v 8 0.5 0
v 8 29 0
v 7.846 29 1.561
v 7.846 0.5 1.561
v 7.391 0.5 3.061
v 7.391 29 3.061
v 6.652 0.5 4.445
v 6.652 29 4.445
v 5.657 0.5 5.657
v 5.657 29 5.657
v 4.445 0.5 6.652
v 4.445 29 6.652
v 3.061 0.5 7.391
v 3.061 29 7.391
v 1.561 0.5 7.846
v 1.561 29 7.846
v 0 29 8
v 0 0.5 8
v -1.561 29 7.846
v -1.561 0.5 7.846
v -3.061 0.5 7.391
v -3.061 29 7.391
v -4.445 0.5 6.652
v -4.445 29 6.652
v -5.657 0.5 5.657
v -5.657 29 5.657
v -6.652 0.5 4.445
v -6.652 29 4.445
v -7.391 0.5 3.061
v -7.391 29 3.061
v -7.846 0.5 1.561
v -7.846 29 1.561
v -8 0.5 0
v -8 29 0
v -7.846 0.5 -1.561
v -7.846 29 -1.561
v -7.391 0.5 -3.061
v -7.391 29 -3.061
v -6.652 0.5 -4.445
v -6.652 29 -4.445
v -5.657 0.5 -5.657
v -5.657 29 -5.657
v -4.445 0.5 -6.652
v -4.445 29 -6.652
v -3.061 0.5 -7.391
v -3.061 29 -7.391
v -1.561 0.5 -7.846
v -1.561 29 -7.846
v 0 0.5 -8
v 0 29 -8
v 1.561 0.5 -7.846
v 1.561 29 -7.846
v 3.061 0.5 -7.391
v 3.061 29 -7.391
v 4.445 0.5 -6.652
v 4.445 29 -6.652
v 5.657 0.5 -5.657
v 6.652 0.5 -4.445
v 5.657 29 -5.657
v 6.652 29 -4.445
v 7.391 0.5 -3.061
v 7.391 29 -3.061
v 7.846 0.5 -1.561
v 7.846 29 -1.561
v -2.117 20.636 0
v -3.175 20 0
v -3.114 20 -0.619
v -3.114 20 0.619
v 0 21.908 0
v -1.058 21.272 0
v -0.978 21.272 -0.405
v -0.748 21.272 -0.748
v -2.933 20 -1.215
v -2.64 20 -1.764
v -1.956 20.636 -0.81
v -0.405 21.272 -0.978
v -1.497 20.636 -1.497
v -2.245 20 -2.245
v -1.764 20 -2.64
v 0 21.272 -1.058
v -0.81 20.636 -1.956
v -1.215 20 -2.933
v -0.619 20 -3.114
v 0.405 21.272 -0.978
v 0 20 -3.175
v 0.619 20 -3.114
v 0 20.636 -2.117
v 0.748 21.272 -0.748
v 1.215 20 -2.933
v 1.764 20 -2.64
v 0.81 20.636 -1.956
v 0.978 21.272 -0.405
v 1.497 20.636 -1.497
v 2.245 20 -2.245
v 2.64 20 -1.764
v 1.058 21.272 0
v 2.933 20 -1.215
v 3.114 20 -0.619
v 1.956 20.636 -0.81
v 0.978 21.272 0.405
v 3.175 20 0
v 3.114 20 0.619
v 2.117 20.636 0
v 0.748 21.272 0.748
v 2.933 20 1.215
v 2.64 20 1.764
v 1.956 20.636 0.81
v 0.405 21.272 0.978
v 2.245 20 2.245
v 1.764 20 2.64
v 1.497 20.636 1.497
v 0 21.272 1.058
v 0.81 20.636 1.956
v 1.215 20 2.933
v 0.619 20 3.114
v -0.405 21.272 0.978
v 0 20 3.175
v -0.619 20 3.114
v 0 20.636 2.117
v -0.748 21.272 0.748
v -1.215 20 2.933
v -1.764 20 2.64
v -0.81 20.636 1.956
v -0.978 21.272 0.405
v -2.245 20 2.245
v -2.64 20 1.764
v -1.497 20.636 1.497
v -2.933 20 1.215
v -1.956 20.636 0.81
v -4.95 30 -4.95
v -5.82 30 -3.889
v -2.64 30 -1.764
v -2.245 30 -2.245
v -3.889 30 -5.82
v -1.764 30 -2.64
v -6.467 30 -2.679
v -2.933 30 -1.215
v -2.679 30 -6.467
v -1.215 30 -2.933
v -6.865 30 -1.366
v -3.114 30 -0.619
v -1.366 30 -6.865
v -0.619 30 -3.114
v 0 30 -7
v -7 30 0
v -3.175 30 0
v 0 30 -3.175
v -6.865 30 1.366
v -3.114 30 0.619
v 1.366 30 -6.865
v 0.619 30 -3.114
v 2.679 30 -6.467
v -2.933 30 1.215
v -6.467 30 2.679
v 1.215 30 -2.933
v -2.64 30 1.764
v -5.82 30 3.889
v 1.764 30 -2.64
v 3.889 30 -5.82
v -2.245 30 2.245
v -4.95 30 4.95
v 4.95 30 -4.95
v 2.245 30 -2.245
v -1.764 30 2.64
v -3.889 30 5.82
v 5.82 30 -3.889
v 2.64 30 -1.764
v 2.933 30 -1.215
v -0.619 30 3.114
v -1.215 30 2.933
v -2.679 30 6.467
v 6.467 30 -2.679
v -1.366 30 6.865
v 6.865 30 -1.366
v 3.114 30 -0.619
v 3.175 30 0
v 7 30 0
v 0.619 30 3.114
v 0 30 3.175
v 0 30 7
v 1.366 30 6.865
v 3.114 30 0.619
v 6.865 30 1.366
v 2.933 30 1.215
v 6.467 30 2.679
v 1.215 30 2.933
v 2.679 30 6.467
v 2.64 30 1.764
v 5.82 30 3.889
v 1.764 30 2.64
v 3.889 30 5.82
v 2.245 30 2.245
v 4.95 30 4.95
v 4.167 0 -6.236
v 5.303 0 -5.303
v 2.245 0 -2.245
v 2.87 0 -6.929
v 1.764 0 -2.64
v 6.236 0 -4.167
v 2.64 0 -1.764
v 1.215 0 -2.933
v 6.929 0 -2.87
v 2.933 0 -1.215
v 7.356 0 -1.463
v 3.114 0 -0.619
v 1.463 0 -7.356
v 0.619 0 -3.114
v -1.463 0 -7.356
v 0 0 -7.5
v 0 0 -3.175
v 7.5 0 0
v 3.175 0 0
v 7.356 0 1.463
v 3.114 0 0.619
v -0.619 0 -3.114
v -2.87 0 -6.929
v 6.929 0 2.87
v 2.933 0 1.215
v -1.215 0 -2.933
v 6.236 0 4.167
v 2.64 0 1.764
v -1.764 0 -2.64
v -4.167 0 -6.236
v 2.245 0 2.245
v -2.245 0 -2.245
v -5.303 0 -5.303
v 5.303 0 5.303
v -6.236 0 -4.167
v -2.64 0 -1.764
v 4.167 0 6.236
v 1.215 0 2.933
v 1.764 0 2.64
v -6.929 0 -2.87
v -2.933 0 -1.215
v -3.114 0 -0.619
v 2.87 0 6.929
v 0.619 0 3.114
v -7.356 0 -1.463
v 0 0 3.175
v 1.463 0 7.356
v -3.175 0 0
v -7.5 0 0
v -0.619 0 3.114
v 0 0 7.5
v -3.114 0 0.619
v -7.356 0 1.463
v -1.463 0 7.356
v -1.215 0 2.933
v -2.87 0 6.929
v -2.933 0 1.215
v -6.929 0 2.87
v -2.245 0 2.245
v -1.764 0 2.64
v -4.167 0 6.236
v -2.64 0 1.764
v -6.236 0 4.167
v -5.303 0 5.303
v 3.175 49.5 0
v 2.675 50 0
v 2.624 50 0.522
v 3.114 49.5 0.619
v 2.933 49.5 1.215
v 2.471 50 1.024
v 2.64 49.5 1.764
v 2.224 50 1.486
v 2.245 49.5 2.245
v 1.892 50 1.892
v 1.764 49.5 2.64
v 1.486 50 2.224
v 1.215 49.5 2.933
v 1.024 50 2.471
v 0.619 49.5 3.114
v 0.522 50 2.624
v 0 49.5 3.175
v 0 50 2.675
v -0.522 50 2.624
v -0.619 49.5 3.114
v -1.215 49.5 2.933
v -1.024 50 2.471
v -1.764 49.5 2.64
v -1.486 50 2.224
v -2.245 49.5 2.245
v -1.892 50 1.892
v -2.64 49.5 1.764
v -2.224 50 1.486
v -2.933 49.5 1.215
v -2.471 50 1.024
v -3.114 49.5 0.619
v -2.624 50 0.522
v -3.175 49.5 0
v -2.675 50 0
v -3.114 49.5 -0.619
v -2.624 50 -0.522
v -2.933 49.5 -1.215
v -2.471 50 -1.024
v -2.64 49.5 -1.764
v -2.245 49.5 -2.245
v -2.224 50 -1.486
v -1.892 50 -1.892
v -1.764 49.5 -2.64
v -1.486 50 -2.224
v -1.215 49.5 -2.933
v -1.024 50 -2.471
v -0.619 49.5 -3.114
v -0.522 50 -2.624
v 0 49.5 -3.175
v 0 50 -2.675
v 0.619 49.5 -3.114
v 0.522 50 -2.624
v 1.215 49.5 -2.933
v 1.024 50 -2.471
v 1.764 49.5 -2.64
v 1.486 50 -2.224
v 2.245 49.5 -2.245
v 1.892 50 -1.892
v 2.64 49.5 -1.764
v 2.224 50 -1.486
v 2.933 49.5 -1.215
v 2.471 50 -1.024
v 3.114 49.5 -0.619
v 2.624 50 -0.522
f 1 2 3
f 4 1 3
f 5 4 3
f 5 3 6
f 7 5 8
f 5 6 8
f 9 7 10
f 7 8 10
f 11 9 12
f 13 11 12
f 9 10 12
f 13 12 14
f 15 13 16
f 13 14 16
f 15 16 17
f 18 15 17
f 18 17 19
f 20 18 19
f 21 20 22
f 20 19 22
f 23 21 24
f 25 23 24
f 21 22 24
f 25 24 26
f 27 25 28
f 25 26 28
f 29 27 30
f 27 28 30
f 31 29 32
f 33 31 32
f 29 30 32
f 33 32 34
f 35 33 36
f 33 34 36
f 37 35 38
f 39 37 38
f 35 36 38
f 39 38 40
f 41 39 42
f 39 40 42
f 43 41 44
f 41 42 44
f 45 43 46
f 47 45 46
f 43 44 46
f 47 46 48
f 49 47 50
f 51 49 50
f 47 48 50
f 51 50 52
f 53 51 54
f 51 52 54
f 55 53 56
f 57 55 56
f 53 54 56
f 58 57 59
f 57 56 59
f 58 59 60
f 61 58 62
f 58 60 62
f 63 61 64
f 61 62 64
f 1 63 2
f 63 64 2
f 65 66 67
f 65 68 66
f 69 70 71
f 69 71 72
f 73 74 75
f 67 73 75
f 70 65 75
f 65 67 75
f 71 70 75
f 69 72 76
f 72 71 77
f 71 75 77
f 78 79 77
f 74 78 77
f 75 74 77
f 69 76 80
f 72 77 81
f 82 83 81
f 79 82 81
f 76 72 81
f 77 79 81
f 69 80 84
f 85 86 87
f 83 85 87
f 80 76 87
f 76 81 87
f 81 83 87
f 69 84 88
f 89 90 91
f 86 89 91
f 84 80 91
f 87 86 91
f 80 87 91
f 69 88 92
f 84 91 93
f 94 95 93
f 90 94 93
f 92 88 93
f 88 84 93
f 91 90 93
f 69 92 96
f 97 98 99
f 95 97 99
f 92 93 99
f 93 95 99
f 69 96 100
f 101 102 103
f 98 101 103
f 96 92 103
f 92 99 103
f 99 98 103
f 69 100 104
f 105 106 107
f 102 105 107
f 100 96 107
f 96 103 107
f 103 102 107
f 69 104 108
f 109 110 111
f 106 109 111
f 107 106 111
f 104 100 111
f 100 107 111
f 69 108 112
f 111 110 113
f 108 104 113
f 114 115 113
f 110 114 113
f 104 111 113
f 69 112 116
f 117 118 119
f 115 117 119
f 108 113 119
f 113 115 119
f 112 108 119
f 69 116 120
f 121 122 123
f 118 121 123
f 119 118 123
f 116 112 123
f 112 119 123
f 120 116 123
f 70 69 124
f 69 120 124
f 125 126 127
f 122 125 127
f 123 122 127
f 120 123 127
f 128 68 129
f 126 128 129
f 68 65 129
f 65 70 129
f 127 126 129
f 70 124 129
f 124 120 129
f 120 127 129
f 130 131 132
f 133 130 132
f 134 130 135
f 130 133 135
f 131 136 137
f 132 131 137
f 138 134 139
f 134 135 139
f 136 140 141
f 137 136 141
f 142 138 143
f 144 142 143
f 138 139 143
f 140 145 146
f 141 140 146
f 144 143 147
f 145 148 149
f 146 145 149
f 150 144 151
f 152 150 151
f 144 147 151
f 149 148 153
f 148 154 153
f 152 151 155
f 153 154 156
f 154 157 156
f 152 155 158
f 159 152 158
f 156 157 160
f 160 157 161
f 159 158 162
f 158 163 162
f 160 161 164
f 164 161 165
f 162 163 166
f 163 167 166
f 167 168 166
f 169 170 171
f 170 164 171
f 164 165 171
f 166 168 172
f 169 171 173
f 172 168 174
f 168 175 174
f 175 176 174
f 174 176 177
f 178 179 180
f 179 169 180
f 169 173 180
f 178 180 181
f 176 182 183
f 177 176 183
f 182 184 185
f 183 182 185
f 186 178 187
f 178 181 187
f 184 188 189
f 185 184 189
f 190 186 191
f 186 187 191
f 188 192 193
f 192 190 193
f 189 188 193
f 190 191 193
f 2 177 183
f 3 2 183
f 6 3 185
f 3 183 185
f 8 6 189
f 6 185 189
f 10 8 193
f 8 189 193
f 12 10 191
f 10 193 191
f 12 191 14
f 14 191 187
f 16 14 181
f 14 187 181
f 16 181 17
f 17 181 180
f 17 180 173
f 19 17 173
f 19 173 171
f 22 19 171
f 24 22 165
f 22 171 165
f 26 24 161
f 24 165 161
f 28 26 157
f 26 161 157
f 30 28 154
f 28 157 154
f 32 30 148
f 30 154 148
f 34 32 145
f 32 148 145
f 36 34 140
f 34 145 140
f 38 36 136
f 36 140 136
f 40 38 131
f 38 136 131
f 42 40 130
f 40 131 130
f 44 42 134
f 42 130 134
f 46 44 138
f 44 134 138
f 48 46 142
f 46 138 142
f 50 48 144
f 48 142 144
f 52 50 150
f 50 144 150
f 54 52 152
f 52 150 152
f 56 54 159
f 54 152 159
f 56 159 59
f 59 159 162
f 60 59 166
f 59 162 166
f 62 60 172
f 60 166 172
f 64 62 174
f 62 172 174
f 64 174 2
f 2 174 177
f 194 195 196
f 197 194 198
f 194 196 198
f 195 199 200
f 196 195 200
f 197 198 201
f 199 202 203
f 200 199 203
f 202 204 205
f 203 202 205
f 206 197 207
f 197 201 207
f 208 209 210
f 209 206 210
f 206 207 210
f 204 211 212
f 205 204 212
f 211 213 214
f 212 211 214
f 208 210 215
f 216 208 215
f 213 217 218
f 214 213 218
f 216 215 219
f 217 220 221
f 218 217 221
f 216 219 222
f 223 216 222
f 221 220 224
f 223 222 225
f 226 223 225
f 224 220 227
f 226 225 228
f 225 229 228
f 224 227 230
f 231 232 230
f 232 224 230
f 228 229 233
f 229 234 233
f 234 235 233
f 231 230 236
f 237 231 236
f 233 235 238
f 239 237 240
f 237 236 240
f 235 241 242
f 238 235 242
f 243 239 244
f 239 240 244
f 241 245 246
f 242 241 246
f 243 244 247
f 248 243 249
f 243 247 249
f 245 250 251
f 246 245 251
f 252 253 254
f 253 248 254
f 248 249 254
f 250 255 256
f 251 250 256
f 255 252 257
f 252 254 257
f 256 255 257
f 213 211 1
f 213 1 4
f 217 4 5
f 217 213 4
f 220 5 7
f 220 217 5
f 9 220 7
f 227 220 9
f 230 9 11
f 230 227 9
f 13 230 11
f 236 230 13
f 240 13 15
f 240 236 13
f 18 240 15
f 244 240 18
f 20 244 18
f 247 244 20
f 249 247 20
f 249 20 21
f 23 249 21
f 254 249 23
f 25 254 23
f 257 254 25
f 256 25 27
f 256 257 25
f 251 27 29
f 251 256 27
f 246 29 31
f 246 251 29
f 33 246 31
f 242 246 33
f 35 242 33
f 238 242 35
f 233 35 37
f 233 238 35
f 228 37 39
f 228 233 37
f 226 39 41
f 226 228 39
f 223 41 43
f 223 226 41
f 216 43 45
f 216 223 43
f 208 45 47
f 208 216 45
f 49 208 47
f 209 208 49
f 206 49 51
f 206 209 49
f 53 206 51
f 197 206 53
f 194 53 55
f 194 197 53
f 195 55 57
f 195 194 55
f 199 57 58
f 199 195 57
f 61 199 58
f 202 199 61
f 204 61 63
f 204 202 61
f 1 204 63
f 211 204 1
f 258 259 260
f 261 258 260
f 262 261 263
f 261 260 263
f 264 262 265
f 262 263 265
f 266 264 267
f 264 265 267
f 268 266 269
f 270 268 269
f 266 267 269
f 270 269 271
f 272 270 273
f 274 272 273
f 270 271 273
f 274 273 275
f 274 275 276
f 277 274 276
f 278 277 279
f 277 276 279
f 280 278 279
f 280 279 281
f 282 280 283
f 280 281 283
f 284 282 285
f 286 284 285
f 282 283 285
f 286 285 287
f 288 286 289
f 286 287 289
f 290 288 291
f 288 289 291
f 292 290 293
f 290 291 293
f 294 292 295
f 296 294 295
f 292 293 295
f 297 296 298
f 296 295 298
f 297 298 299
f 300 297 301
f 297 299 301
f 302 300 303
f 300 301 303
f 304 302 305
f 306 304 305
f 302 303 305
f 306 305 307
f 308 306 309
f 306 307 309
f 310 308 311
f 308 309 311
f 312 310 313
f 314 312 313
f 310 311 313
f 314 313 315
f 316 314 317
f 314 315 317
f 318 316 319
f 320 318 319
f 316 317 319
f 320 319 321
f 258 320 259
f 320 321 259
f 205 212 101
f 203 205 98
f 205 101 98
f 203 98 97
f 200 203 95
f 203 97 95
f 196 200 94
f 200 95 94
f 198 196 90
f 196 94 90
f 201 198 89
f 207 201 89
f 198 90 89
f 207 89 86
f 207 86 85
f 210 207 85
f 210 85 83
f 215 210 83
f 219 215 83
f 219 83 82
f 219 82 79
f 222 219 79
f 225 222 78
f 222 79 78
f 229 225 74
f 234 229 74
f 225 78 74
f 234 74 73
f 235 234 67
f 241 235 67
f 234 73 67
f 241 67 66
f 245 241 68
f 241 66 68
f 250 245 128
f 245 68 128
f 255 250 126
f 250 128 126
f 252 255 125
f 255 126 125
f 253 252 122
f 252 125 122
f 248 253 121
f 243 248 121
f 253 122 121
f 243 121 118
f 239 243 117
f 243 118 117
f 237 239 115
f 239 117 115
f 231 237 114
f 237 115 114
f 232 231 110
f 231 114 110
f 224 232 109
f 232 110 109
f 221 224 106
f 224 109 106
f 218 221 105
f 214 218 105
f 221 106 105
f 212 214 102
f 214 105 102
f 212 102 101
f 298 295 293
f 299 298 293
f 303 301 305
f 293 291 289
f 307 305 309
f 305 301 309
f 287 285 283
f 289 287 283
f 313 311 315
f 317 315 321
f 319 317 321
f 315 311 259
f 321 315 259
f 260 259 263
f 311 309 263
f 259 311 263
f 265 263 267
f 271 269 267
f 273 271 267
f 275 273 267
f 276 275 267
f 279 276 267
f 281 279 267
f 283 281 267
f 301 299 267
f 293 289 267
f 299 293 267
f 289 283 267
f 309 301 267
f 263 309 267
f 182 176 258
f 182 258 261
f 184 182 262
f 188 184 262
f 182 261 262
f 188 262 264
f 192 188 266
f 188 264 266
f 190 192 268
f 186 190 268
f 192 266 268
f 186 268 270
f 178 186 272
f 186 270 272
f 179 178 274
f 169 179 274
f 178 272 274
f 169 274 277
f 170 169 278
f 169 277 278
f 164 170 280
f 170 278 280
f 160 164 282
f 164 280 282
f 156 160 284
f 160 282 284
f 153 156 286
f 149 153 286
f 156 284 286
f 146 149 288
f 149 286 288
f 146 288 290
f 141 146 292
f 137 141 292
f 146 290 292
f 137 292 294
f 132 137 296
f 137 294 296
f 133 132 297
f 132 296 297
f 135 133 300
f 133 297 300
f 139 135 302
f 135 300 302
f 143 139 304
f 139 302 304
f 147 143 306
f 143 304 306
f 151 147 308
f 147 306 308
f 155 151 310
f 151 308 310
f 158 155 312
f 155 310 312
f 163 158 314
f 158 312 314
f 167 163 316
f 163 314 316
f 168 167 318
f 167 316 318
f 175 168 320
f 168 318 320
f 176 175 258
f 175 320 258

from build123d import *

# Parameters (mm, degrees)
CHANFREIN1_SIZE                     = 1
CHANFREIN2_SIZE                     = 0.5
DIAM_TRE_DU_PER_AGE_6_3_6_3_1_D     = 6.35
DIAM_TRE_DU_PER_AGE_6_3_6_3_1_DEPTH = 20
DIAM_TRE_DU_PER_AGE_6_3_6_3_1_TIP   = 1.907732465


with BuildPart() as part:
    # Esquisse1 → Révolution1 (revolve)
    with BuildSketch(Plane.XY):
        Polygon((0, 0), (8, 0), (8, 30), (3.175, 30), (3.175, 50), (0, 50), align=None)
    revolve(axis=Axis((0, 50, 0), (0, -1, 0)))

    # Chanfrein1
    chanfrein1_edges = [part.edges().sort_by_distance(p)[0] for p in [
        (-8, 30, 0),
    ]]
    chamfer(chanfrein1_edges, length=CHANFREIN1_SIZE)

    # Chanfrein2
    chanfrein2_edges = [part.edges().sort_by_distance(p)[0] for p in [
        (-8, 0, 0),
        (-3.175, 50, 0),
    ]]
    chamfer(chanfrein2_edges, length=CHANFREIN2_SIZE)

    # Diamètre du perçage Ø6.3 (6.3)1
    with Locations(Plane(origin=(0, 0, 0), x_dir=(-1, 0, 0), z_dir=(0, -1, 0))):
        with Locations((0, 0)):
            Hole(DIAM_TRE_DU_PER_AGE_6_3_6_3_1_D / 2, depth=DIAM_TRE_DU_PER_AGE_6_3_6_3_1_DEPTH)
            with Locations((0, 0, -(DIAM_TRE_DU_PER_AGE_6_3_6_3_1_DEPTH + DIAM_TRE_DU_PER_AGE_6_3_6_3_1_TIP / 2))):  # 118° drill point
                Cone(0, DIAM_TRE_DU_PER_AGE_6_3_6_3_1_D / 2, DIAM_TRE_DU_PER_AGE_6_3_6_3_1_TIP, mode=Mode.SUBTRACT)


solid = part.part
